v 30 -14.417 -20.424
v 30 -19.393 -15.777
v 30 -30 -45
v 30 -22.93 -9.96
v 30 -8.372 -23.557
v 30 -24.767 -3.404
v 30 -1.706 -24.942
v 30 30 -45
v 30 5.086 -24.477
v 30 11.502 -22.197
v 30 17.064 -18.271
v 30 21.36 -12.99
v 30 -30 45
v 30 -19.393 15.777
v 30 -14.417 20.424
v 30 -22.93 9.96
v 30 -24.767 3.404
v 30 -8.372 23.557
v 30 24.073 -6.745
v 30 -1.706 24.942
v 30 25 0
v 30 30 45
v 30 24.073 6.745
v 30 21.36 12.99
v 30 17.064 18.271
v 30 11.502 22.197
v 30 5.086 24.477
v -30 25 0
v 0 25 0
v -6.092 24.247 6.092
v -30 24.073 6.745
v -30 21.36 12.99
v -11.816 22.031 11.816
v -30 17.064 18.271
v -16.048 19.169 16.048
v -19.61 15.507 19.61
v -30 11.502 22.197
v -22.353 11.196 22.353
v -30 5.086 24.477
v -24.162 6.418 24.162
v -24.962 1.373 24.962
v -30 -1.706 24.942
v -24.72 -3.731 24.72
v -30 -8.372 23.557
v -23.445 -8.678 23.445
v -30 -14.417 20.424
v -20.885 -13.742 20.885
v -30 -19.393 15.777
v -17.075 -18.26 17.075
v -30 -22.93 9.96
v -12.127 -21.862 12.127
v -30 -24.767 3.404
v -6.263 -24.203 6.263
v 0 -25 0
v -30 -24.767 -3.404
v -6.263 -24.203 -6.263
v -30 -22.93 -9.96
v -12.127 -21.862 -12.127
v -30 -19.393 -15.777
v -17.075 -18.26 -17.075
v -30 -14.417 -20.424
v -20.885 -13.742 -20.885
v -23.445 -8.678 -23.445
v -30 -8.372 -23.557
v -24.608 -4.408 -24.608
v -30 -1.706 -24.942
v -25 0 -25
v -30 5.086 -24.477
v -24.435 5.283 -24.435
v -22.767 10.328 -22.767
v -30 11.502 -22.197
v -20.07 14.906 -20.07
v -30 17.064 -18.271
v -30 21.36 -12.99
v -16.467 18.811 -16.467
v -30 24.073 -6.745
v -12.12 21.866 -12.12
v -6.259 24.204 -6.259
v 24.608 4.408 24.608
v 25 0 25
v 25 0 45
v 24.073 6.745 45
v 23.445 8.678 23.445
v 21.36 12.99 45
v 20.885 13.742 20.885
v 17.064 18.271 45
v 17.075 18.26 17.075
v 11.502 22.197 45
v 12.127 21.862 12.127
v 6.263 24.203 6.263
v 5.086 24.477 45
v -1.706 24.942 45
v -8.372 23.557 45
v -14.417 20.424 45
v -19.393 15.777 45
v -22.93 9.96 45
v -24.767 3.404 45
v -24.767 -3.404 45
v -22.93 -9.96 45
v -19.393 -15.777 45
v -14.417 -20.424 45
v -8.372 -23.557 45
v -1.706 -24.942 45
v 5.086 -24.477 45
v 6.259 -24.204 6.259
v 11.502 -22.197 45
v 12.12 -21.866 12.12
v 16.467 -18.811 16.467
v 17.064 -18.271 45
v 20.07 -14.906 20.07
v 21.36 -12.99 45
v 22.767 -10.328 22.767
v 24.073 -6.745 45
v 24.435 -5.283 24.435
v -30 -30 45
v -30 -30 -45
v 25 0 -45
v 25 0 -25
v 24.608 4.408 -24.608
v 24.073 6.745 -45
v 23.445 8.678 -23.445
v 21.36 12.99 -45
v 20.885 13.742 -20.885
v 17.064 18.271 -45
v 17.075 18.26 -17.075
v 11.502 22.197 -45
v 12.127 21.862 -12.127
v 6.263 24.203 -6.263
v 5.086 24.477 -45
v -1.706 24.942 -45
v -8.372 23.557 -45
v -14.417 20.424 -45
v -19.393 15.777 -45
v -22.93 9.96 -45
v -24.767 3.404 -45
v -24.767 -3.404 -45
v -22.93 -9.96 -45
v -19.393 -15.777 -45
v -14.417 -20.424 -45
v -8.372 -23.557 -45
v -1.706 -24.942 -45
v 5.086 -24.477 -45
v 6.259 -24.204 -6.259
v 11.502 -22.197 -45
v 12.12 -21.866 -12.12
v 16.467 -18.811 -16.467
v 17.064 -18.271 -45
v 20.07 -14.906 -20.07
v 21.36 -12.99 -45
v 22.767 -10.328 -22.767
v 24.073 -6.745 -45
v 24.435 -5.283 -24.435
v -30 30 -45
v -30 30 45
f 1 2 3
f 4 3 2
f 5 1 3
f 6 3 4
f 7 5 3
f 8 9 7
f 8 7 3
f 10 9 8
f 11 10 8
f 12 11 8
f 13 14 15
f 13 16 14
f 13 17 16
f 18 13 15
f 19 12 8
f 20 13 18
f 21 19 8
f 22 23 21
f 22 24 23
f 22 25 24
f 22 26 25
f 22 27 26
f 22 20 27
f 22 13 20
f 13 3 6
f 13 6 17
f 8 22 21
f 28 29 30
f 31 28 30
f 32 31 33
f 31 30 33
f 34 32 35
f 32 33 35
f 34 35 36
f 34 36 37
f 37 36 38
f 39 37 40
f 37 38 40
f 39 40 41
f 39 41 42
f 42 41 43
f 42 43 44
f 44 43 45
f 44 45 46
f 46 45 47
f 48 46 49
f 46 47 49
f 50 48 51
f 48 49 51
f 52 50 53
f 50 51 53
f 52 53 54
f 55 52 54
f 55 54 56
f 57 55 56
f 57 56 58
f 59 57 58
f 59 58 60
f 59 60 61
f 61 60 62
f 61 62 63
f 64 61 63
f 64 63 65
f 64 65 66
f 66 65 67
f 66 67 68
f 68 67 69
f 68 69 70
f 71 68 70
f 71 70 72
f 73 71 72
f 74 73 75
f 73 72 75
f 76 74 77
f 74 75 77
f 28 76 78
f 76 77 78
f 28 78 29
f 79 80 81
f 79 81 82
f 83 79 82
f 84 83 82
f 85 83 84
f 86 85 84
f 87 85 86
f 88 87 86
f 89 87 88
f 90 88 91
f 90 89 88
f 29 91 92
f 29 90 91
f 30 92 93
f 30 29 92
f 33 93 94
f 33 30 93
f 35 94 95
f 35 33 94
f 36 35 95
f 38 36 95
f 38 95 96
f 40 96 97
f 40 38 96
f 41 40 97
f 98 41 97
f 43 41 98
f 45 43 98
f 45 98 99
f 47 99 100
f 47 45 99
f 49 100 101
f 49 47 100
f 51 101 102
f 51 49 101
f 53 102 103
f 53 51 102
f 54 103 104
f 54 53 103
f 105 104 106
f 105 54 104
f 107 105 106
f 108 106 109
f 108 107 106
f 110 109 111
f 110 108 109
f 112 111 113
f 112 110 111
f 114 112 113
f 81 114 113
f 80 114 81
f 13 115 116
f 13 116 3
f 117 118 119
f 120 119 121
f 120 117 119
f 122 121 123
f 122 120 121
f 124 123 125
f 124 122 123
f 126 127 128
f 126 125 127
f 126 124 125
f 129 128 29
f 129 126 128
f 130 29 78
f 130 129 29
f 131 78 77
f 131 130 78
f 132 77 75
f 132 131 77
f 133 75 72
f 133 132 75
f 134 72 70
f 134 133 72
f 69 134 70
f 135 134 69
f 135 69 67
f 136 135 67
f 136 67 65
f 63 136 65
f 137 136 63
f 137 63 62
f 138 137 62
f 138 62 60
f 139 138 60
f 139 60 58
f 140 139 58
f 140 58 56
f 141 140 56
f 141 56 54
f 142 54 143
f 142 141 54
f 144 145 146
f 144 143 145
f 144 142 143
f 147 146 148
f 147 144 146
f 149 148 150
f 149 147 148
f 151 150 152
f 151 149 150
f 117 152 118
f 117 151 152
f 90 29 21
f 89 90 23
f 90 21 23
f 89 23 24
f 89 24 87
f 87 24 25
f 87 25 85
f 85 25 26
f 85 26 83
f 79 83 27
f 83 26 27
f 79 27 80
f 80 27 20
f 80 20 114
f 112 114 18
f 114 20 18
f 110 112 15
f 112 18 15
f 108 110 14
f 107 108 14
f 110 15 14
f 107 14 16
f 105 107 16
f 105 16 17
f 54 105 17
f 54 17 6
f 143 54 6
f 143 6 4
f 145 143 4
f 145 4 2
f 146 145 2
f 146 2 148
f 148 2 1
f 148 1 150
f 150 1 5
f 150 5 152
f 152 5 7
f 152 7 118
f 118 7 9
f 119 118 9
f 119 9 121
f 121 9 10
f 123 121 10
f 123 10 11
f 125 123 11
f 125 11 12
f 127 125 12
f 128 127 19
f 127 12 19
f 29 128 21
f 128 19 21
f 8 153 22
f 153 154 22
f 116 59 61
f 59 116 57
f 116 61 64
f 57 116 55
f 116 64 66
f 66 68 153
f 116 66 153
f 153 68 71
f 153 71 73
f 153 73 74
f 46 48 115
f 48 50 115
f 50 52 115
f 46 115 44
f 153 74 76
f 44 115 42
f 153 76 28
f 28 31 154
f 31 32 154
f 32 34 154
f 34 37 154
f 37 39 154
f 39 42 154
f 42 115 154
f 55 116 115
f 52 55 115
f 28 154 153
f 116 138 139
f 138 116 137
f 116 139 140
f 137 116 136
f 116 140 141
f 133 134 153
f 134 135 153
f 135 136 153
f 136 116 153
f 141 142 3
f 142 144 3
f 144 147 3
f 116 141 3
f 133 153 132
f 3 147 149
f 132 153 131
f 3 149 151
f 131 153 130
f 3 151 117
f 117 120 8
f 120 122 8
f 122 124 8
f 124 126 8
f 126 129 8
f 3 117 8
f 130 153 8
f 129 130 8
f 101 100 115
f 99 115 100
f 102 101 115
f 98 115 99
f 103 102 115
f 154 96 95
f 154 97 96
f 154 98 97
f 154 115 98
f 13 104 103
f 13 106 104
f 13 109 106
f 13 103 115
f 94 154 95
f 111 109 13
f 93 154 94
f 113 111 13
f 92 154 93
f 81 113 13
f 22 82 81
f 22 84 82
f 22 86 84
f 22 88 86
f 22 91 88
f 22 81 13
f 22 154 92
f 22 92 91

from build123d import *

# Parameters (mm, degrees)
F0_W     = 60
F0_H     = 60
F0_R     = 25
F1_DEPTH = 45
F2_R     = 25
F3_DEPTH = 60.001


with BuildPart() as f1:
    # F0 (on Top) → F1 (new body, symmetric)
    with BuildSketch(Plane.XY):
        Rectangle(F0_W, F0_H)
        Circle(F0_R, mode=Mode.SUBTRACT)
    extrude(amount=F1_DEPTH, both=True)

    # F2 (on face) → F3 (cut, through all)
    with BuildSketch(Plane.YZ.offset(30)):
        Circle(F2_R)
    extrude(amount=-F3_DEPTH, mode=Mode.SUBTRACT)


solid = f1.part
